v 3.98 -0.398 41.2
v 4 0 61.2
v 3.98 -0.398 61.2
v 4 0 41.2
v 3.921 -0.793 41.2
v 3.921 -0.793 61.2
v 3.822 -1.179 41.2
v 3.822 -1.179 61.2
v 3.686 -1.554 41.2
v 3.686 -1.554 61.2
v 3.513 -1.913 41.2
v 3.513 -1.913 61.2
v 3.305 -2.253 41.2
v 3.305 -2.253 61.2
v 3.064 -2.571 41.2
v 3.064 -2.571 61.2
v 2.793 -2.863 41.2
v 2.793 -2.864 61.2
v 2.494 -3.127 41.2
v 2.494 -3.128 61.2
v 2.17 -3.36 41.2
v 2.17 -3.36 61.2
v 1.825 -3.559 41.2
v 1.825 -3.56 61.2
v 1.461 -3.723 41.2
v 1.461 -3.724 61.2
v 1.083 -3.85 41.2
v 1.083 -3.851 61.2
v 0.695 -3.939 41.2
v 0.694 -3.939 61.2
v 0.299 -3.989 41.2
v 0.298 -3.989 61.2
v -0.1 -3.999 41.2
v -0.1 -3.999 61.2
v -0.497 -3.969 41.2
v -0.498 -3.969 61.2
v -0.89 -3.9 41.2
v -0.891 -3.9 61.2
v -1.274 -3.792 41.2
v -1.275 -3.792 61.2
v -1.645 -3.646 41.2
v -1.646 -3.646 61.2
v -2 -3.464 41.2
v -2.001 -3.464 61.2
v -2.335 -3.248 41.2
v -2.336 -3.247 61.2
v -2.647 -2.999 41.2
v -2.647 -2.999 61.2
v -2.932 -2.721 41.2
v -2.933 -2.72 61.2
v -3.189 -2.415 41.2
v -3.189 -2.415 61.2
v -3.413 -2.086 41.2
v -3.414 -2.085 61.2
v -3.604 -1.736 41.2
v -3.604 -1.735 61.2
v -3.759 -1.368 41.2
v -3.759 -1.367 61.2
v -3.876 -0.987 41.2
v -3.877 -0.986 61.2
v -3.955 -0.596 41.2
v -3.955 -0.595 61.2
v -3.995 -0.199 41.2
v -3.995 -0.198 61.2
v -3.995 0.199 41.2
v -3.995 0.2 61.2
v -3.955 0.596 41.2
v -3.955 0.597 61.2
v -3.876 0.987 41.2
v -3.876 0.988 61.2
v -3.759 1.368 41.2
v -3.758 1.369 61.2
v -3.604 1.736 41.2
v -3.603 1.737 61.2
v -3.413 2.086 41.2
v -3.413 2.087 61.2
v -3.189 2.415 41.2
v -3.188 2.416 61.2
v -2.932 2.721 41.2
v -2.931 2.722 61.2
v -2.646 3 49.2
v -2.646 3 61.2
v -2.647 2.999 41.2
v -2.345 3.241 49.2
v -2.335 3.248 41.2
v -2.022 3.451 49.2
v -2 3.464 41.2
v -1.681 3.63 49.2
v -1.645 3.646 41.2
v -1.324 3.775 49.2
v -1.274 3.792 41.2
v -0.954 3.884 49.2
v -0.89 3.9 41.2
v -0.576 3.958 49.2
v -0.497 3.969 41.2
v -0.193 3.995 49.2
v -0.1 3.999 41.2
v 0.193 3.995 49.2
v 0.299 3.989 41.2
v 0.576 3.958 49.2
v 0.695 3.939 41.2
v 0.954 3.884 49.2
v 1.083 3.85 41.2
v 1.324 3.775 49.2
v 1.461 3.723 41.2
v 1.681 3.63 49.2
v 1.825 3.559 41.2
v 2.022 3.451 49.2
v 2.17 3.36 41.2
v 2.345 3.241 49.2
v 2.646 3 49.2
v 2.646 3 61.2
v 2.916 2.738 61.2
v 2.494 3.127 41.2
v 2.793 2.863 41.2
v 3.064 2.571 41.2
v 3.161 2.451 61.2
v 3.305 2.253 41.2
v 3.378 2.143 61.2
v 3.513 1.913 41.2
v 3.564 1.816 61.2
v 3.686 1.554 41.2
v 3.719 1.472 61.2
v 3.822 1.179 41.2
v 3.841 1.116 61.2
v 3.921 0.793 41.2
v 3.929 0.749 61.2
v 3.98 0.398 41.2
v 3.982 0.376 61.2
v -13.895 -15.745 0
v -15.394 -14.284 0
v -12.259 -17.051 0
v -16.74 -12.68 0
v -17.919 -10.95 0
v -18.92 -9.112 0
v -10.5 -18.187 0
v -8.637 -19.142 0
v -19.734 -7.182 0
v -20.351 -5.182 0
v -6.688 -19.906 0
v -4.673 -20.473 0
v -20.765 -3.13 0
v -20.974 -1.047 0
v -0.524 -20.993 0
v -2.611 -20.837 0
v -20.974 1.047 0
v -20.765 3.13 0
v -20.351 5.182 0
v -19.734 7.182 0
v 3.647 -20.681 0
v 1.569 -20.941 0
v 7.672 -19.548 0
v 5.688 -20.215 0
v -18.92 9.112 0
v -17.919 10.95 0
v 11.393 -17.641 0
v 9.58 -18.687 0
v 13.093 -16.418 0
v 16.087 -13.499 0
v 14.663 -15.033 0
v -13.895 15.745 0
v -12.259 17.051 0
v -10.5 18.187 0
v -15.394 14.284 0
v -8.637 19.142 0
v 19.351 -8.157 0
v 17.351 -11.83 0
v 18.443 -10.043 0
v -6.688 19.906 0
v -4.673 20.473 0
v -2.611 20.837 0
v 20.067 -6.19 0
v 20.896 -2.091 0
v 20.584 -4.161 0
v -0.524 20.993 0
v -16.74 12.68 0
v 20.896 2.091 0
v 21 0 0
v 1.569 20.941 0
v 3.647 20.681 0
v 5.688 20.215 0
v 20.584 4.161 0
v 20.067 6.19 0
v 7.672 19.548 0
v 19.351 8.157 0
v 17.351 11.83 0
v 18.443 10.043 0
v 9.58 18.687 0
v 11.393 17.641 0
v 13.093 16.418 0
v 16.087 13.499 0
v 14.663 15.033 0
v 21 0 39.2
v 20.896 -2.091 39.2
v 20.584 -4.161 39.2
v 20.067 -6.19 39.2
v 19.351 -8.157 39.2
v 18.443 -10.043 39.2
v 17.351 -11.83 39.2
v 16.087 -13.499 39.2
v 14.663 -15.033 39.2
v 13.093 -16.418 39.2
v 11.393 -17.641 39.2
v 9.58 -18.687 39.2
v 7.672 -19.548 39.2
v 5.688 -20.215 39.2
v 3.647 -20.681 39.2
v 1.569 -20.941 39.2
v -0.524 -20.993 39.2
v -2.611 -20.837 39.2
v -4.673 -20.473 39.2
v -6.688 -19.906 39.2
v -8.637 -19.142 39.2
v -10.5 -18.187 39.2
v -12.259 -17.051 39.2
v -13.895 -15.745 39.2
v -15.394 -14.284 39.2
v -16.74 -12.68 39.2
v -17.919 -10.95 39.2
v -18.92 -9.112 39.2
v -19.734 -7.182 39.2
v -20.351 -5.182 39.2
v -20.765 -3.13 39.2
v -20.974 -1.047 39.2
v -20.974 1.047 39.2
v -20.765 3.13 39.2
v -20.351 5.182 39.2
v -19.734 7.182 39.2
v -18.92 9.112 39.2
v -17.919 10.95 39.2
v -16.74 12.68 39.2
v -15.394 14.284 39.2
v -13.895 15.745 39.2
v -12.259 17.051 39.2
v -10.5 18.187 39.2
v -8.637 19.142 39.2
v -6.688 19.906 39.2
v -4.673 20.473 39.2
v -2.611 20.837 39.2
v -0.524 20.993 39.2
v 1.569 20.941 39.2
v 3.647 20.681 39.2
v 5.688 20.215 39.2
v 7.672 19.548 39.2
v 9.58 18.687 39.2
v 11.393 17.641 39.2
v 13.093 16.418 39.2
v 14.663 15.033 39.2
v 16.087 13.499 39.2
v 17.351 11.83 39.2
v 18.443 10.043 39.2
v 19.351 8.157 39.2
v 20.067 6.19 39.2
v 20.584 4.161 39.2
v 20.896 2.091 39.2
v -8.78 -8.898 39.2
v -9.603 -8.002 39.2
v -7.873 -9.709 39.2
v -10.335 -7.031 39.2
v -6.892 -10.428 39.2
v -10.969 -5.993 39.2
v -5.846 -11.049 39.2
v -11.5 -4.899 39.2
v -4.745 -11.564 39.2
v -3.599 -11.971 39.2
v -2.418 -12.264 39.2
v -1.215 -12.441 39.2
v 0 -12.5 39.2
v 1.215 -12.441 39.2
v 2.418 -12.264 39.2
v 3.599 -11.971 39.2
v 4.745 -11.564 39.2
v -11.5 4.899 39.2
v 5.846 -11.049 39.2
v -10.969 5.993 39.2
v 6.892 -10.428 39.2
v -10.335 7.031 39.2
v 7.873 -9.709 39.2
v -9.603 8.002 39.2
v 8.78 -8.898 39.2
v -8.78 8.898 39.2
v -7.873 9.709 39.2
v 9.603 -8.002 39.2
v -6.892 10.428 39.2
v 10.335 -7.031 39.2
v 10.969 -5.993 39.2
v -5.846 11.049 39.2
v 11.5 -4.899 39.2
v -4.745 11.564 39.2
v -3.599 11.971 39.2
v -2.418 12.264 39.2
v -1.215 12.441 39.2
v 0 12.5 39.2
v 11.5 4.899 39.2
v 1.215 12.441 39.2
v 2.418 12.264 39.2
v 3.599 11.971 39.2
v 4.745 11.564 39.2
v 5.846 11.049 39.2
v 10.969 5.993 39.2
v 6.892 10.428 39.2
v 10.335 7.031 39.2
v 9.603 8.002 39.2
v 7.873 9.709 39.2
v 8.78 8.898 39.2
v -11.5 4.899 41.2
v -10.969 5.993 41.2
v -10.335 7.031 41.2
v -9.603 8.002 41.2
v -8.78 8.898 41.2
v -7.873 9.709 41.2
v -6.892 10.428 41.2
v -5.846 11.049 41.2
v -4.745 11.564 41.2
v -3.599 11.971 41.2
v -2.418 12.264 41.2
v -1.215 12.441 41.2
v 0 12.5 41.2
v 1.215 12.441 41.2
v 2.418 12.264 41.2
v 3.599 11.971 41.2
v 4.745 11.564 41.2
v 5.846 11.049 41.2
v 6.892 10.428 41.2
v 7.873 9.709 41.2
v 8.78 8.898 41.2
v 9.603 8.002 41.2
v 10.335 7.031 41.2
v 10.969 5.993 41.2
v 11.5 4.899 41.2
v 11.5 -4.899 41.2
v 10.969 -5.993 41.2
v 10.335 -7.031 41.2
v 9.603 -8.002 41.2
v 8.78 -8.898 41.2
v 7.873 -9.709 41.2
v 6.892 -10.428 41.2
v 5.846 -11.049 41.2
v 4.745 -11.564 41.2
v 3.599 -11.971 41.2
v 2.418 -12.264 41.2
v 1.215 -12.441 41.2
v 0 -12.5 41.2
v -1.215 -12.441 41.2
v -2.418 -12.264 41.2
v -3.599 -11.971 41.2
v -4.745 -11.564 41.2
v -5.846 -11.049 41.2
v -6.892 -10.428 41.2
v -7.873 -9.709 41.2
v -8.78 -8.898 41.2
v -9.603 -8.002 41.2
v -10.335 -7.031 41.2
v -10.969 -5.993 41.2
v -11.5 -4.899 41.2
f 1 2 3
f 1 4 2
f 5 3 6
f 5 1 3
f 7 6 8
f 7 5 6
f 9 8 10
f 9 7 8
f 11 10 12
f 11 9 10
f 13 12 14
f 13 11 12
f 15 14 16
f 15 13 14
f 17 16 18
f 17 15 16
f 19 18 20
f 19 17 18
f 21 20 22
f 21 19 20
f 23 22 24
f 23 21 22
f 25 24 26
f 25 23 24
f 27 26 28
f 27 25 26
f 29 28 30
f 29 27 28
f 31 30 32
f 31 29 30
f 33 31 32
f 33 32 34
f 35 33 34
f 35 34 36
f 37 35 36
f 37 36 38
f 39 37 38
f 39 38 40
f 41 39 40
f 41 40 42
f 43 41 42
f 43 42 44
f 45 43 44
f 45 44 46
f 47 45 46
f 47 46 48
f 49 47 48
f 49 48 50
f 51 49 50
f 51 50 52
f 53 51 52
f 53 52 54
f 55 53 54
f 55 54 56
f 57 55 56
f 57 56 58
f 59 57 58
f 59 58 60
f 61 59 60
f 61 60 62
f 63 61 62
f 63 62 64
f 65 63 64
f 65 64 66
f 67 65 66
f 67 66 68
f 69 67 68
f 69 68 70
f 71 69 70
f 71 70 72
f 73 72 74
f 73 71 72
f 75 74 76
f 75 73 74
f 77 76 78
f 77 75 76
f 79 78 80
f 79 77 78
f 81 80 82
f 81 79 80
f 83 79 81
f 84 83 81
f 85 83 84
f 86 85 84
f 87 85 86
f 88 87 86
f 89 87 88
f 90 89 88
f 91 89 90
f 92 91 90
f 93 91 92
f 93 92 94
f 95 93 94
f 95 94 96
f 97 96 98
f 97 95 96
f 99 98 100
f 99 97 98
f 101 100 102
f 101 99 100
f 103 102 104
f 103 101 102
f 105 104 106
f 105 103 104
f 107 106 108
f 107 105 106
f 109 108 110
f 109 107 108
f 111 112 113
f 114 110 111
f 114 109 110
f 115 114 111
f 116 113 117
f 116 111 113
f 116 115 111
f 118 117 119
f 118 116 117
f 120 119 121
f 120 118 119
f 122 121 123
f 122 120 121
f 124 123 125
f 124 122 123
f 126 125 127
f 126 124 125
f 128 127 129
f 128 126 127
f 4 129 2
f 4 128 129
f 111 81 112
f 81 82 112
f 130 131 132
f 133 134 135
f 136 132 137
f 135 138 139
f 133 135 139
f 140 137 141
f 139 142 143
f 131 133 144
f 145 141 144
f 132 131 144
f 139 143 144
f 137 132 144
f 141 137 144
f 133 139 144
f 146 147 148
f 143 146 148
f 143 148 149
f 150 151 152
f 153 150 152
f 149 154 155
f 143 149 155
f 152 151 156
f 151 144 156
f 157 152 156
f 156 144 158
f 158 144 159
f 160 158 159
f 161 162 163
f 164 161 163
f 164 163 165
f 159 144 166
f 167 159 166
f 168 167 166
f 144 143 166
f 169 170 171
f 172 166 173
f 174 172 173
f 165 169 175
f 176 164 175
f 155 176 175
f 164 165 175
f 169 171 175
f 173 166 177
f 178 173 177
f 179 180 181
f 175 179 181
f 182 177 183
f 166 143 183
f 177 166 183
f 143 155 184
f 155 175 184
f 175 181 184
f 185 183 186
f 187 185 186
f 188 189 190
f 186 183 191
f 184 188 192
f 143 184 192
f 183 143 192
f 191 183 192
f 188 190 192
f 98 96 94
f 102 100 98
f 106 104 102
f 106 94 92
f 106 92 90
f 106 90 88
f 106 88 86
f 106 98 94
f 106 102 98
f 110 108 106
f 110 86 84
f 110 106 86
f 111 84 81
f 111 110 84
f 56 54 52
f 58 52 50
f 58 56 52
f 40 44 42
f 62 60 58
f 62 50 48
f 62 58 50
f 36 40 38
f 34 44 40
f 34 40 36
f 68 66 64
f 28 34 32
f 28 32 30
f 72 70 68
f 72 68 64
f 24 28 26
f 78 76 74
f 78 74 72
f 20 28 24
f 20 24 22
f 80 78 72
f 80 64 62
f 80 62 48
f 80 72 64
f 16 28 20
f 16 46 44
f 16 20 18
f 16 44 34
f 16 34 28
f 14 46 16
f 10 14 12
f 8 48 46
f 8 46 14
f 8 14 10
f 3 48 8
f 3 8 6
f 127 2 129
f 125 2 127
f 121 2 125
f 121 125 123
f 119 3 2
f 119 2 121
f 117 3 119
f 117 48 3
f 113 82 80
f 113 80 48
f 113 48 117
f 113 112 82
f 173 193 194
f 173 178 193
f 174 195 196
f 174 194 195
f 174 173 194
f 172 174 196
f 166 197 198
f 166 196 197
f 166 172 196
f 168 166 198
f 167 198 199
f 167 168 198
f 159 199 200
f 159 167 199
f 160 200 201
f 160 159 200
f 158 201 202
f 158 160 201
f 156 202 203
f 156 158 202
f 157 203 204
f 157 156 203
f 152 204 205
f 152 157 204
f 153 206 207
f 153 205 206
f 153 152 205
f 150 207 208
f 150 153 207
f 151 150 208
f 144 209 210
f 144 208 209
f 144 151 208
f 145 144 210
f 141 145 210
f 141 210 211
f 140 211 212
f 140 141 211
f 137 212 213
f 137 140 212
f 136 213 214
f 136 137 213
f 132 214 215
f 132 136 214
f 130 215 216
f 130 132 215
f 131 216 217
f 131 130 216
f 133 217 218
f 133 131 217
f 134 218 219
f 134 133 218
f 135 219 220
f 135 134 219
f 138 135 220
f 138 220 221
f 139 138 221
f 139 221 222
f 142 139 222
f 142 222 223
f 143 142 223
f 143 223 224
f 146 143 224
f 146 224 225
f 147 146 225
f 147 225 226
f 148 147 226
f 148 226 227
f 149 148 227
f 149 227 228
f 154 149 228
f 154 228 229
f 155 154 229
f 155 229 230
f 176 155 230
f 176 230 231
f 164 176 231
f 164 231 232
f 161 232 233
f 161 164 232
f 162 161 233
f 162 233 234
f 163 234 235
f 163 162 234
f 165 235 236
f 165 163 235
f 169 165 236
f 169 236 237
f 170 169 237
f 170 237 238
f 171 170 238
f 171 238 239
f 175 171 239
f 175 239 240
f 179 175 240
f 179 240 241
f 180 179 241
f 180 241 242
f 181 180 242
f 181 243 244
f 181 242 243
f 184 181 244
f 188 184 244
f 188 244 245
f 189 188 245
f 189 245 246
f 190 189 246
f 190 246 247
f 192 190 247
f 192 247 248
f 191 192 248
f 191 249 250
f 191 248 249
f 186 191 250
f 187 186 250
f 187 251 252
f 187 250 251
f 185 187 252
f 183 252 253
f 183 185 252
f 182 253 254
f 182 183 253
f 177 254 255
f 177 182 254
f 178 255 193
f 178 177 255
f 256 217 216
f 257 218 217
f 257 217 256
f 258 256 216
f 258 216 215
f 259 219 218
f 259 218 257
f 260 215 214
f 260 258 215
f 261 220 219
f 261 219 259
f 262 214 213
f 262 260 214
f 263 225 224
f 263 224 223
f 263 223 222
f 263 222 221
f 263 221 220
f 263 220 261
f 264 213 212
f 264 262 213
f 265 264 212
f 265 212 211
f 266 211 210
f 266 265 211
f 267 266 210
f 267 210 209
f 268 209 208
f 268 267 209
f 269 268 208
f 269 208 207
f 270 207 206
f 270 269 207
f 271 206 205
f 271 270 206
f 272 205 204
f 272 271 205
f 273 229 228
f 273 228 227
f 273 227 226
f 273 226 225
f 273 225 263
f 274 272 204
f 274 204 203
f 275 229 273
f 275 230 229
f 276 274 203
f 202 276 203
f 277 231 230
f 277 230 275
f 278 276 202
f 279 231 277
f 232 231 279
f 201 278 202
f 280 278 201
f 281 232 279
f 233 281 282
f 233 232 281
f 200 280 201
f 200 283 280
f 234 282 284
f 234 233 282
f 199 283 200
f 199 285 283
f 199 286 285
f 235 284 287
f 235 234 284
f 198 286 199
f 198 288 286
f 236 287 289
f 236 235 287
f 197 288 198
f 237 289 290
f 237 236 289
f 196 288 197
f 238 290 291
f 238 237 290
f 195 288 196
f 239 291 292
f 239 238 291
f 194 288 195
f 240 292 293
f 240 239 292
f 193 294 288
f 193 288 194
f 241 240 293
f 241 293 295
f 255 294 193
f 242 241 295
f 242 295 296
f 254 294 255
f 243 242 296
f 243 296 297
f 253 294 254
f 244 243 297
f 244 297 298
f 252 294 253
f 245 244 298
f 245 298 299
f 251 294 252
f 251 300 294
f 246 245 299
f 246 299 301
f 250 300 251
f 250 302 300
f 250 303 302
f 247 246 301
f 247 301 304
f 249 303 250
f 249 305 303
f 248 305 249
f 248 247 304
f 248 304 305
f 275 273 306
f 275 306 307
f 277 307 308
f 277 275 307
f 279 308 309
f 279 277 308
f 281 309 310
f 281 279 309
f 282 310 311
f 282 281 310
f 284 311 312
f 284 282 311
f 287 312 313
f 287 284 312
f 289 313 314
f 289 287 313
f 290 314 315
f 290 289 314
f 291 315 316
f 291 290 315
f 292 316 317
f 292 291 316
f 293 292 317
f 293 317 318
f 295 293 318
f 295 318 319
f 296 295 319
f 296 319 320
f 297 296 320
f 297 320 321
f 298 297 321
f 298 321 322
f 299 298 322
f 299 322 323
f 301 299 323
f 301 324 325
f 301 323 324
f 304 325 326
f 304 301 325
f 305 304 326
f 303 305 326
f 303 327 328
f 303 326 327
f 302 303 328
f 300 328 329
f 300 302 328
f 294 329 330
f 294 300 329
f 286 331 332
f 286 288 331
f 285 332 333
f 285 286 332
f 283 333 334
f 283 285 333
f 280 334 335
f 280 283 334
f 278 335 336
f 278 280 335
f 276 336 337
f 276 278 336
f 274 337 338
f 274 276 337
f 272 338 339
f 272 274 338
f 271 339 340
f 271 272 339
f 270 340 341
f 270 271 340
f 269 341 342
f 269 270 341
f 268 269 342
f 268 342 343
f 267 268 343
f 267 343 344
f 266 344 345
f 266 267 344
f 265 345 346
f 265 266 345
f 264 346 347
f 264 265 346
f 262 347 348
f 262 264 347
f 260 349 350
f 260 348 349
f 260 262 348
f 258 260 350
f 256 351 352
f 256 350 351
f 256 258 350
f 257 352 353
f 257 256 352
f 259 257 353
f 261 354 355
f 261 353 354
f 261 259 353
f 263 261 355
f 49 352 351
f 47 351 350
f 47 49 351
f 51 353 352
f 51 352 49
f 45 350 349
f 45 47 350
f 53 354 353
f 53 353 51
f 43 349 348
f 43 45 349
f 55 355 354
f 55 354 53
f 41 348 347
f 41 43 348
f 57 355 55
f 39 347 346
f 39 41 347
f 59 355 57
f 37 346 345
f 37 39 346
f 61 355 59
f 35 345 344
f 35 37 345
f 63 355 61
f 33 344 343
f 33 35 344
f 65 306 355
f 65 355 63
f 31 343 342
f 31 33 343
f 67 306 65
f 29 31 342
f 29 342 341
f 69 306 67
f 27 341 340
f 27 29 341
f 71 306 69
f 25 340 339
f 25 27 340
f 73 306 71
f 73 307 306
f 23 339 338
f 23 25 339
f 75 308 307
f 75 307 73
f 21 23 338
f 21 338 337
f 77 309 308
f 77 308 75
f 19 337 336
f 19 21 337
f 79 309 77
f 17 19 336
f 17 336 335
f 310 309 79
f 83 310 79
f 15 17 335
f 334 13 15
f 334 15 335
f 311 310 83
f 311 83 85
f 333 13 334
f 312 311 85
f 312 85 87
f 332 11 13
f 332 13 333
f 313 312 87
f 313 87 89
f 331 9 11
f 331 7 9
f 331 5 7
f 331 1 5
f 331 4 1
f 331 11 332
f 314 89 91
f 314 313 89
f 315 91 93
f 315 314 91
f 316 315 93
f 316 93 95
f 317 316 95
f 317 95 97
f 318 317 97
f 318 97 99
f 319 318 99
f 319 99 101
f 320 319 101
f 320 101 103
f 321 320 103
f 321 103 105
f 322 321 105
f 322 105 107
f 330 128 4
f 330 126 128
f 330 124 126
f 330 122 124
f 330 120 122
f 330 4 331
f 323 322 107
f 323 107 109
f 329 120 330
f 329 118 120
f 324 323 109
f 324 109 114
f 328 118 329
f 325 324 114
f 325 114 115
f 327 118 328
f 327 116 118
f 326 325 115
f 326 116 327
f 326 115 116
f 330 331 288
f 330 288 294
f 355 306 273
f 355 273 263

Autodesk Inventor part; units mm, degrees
ref_plane "YZ Plane" through (0, 0, 0) normal (1, 0, 0) x (0, 1, 0)
ref_plane "XZ Plane" through (0, 0, 0) normal (0, 1, 0) x (-1, 0, 0)
ref_plane "XY Plane" through (0, 0, 0) normal (0, 0, 1) x (1, 0, 0)
sketch "スケッチ1" plane through (0, 0, 0) normal (0, 0, 1) x (1, 0, 0)
  circle A0 centre (0, 0) radius 21
  dimension "d0" = 42
extrude "押し出し1" add sketch "スケッチ1" along normal blind 39.2
sketch "スケッチ2" plane through (0, 0, 39.2) normal (0, 0, 1) x (1, 0, 0)
  circle A0 centre (0, 0) radius 12.5
  dimension "d3" = 25
extrude "押し出し2" add sketch "スケッチ2" along normal blind 2
sketch "スケッチ3" plane through (0, 0, 41.2) normal (0, 0, 1) x (1, 0, 0)
  circle A0 centre (0, 0) radius 4
  dimension "d6" = 8
extrude "押し出し3" add sketch "スケッチ3" along normal blind 20
sketch "スケッチ4" plane through (0, 0, 61.2) normal (0, 0, 1) x (1, 0, 0)
  circle A0 centre (0, 0) radius 4 projected
  circle A1 centre (0, 0) radius 4 projected
  line L0 (-2.6458, 3) -> (2.6458, 3)
  point P0 (0, 3)
  dimension "d9" = 3
extrude "押し出し4" cut sketch "スケッチ4" against normal blind 12 contours L0 A0 picked at (-0.6179, 3.1815)
sketch "スケッチ5" plane through (0, 0, 41.2) normal (0, 0, 1) x (1, 0, 0)
  circle A0 centre (0, 0) radius 12.5 projected
  line L0 (-11.5, 4.899) -> (-11.5, -4.899)
  line L1 (11.5, -4.899) -> (11.5, 4.899)
  point P0 (-11.5, 0)
  point P1 (11.5, 0)
  dimension "d12" = 11.5
  dimension "d13" = 11.5
extrude "押し出し5" cut sketch "スケッチ5" against normal blind 2 contours A0 L1 | L0 A0
equation "\"BendRadius\" = Thickness"
equation "\"BendReliefWidth\" = Thickness"
equation "\"BendReliefDepth\" = 0.5 * Thickness"
equation "\"CornerReliefSize\" = 4 * Thickness"
equation "\"MinimumRemnant\" = 2 * Thickness"
equation "\"TransitionRadius\" = BendRadius"
equation "\"JacobiRadiusSize\" = BendRadius"
equation "\"GapSize\" = Thickness"
equation "\"Thickness\" = 0.5"
properties part number "nhk_purry" material "ステンレス鋼"
